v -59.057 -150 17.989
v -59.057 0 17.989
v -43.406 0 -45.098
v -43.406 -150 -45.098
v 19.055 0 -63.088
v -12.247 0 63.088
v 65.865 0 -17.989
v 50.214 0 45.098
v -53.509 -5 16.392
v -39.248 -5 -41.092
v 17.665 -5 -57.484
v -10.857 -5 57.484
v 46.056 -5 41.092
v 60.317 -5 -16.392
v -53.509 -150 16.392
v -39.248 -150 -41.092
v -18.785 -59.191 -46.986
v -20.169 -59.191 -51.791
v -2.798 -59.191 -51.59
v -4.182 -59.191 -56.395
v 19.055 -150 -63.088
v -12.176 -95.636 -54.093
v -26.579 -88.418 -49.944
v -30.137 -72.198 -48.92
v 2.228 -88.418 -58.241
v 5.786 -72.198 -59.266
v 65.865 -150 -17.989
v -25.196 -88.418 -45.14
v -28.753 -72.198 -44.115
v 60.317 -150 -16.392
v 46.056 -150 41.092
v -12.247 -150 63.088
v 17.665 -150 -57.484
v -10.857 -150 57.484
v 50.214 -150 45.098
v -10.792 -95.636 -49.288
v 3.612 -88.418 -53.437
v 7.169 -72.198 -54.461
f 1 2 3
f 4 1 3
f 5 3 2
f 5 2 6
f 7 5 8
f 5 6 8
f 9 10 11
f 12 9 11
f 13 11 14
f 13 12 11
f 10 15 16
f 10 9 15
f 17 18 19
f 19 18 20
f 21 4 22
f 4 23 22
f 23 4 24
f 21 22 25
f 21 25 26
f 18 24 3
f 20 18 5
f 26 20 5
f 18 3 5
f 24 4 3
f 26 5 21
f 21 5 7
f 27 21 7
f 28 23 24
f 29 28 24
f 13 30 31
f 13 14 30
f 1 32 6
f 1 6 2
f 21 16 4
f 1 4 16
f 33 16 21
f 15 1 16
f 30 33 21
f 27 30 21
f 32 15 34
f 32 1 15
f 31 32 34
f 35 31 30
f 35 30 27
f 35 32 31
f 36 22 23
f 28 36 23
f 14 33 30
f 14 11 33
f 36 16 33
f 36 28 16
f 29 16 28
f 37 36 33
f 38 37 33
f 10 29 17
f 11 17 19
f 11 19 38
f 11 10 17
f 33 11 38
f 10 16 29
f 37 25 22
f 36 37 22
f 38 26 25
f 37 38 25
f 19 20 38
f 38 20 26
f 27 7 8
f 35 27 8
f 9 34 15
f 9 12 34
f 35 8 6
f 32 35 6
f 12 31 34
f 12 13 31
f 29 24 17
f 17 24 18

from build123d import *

# Parameters (mm, degrees)
F1_DEPTH = 150
F2_T     = -5
F4_DEPTH = 25


with BuildPart() as f1:
    # F0 (on Front) → F1 (new body)
    with BuildSketch(Plane.XZ):
        Polygon((-12.2474321396, 63.0875647986), (-59.0572801928, 17.9894703241), (-43.4061087422, -45.0980944746), (19.0549107617, -63.0875647986), (65.8647588149, -17.9894703241), (50.2135873642, 45.0980944746), align=None)
    extrude(amount=F1_DEPTH)

    # F2
    f2_openings = [f1.faces().sort_by_distance(p)[0] for p in [
        (3.403739, -150, 0),
    ]]
    offset(amount=F2_T, openings=f2_openings)

    # F3 (on face) → F4 (cut)
    with BuildSketch(Plane(origin=(-15.3186231144, 0, -53.1876036307), x_dir=(0.9609387616, 0, -0.2767610819), z_dir=(-0.2767610819, 0, -0.9609387616))):
        Polygon((-5.047660324, 59.1908805072), (11.5892304007, 59.1908805072), (21.9621621023, 72.1981254462), (18.26010564, 88.4178945857), (3.2707850383, 95.6363709407), (-11.7185355634, 88.4178945857), (-15.4205920256, 72.1981254462), align=None)
    extrude(amount=-F4_DEPTH, mode=Mode.SUBTRACT)


solid = f1.part
